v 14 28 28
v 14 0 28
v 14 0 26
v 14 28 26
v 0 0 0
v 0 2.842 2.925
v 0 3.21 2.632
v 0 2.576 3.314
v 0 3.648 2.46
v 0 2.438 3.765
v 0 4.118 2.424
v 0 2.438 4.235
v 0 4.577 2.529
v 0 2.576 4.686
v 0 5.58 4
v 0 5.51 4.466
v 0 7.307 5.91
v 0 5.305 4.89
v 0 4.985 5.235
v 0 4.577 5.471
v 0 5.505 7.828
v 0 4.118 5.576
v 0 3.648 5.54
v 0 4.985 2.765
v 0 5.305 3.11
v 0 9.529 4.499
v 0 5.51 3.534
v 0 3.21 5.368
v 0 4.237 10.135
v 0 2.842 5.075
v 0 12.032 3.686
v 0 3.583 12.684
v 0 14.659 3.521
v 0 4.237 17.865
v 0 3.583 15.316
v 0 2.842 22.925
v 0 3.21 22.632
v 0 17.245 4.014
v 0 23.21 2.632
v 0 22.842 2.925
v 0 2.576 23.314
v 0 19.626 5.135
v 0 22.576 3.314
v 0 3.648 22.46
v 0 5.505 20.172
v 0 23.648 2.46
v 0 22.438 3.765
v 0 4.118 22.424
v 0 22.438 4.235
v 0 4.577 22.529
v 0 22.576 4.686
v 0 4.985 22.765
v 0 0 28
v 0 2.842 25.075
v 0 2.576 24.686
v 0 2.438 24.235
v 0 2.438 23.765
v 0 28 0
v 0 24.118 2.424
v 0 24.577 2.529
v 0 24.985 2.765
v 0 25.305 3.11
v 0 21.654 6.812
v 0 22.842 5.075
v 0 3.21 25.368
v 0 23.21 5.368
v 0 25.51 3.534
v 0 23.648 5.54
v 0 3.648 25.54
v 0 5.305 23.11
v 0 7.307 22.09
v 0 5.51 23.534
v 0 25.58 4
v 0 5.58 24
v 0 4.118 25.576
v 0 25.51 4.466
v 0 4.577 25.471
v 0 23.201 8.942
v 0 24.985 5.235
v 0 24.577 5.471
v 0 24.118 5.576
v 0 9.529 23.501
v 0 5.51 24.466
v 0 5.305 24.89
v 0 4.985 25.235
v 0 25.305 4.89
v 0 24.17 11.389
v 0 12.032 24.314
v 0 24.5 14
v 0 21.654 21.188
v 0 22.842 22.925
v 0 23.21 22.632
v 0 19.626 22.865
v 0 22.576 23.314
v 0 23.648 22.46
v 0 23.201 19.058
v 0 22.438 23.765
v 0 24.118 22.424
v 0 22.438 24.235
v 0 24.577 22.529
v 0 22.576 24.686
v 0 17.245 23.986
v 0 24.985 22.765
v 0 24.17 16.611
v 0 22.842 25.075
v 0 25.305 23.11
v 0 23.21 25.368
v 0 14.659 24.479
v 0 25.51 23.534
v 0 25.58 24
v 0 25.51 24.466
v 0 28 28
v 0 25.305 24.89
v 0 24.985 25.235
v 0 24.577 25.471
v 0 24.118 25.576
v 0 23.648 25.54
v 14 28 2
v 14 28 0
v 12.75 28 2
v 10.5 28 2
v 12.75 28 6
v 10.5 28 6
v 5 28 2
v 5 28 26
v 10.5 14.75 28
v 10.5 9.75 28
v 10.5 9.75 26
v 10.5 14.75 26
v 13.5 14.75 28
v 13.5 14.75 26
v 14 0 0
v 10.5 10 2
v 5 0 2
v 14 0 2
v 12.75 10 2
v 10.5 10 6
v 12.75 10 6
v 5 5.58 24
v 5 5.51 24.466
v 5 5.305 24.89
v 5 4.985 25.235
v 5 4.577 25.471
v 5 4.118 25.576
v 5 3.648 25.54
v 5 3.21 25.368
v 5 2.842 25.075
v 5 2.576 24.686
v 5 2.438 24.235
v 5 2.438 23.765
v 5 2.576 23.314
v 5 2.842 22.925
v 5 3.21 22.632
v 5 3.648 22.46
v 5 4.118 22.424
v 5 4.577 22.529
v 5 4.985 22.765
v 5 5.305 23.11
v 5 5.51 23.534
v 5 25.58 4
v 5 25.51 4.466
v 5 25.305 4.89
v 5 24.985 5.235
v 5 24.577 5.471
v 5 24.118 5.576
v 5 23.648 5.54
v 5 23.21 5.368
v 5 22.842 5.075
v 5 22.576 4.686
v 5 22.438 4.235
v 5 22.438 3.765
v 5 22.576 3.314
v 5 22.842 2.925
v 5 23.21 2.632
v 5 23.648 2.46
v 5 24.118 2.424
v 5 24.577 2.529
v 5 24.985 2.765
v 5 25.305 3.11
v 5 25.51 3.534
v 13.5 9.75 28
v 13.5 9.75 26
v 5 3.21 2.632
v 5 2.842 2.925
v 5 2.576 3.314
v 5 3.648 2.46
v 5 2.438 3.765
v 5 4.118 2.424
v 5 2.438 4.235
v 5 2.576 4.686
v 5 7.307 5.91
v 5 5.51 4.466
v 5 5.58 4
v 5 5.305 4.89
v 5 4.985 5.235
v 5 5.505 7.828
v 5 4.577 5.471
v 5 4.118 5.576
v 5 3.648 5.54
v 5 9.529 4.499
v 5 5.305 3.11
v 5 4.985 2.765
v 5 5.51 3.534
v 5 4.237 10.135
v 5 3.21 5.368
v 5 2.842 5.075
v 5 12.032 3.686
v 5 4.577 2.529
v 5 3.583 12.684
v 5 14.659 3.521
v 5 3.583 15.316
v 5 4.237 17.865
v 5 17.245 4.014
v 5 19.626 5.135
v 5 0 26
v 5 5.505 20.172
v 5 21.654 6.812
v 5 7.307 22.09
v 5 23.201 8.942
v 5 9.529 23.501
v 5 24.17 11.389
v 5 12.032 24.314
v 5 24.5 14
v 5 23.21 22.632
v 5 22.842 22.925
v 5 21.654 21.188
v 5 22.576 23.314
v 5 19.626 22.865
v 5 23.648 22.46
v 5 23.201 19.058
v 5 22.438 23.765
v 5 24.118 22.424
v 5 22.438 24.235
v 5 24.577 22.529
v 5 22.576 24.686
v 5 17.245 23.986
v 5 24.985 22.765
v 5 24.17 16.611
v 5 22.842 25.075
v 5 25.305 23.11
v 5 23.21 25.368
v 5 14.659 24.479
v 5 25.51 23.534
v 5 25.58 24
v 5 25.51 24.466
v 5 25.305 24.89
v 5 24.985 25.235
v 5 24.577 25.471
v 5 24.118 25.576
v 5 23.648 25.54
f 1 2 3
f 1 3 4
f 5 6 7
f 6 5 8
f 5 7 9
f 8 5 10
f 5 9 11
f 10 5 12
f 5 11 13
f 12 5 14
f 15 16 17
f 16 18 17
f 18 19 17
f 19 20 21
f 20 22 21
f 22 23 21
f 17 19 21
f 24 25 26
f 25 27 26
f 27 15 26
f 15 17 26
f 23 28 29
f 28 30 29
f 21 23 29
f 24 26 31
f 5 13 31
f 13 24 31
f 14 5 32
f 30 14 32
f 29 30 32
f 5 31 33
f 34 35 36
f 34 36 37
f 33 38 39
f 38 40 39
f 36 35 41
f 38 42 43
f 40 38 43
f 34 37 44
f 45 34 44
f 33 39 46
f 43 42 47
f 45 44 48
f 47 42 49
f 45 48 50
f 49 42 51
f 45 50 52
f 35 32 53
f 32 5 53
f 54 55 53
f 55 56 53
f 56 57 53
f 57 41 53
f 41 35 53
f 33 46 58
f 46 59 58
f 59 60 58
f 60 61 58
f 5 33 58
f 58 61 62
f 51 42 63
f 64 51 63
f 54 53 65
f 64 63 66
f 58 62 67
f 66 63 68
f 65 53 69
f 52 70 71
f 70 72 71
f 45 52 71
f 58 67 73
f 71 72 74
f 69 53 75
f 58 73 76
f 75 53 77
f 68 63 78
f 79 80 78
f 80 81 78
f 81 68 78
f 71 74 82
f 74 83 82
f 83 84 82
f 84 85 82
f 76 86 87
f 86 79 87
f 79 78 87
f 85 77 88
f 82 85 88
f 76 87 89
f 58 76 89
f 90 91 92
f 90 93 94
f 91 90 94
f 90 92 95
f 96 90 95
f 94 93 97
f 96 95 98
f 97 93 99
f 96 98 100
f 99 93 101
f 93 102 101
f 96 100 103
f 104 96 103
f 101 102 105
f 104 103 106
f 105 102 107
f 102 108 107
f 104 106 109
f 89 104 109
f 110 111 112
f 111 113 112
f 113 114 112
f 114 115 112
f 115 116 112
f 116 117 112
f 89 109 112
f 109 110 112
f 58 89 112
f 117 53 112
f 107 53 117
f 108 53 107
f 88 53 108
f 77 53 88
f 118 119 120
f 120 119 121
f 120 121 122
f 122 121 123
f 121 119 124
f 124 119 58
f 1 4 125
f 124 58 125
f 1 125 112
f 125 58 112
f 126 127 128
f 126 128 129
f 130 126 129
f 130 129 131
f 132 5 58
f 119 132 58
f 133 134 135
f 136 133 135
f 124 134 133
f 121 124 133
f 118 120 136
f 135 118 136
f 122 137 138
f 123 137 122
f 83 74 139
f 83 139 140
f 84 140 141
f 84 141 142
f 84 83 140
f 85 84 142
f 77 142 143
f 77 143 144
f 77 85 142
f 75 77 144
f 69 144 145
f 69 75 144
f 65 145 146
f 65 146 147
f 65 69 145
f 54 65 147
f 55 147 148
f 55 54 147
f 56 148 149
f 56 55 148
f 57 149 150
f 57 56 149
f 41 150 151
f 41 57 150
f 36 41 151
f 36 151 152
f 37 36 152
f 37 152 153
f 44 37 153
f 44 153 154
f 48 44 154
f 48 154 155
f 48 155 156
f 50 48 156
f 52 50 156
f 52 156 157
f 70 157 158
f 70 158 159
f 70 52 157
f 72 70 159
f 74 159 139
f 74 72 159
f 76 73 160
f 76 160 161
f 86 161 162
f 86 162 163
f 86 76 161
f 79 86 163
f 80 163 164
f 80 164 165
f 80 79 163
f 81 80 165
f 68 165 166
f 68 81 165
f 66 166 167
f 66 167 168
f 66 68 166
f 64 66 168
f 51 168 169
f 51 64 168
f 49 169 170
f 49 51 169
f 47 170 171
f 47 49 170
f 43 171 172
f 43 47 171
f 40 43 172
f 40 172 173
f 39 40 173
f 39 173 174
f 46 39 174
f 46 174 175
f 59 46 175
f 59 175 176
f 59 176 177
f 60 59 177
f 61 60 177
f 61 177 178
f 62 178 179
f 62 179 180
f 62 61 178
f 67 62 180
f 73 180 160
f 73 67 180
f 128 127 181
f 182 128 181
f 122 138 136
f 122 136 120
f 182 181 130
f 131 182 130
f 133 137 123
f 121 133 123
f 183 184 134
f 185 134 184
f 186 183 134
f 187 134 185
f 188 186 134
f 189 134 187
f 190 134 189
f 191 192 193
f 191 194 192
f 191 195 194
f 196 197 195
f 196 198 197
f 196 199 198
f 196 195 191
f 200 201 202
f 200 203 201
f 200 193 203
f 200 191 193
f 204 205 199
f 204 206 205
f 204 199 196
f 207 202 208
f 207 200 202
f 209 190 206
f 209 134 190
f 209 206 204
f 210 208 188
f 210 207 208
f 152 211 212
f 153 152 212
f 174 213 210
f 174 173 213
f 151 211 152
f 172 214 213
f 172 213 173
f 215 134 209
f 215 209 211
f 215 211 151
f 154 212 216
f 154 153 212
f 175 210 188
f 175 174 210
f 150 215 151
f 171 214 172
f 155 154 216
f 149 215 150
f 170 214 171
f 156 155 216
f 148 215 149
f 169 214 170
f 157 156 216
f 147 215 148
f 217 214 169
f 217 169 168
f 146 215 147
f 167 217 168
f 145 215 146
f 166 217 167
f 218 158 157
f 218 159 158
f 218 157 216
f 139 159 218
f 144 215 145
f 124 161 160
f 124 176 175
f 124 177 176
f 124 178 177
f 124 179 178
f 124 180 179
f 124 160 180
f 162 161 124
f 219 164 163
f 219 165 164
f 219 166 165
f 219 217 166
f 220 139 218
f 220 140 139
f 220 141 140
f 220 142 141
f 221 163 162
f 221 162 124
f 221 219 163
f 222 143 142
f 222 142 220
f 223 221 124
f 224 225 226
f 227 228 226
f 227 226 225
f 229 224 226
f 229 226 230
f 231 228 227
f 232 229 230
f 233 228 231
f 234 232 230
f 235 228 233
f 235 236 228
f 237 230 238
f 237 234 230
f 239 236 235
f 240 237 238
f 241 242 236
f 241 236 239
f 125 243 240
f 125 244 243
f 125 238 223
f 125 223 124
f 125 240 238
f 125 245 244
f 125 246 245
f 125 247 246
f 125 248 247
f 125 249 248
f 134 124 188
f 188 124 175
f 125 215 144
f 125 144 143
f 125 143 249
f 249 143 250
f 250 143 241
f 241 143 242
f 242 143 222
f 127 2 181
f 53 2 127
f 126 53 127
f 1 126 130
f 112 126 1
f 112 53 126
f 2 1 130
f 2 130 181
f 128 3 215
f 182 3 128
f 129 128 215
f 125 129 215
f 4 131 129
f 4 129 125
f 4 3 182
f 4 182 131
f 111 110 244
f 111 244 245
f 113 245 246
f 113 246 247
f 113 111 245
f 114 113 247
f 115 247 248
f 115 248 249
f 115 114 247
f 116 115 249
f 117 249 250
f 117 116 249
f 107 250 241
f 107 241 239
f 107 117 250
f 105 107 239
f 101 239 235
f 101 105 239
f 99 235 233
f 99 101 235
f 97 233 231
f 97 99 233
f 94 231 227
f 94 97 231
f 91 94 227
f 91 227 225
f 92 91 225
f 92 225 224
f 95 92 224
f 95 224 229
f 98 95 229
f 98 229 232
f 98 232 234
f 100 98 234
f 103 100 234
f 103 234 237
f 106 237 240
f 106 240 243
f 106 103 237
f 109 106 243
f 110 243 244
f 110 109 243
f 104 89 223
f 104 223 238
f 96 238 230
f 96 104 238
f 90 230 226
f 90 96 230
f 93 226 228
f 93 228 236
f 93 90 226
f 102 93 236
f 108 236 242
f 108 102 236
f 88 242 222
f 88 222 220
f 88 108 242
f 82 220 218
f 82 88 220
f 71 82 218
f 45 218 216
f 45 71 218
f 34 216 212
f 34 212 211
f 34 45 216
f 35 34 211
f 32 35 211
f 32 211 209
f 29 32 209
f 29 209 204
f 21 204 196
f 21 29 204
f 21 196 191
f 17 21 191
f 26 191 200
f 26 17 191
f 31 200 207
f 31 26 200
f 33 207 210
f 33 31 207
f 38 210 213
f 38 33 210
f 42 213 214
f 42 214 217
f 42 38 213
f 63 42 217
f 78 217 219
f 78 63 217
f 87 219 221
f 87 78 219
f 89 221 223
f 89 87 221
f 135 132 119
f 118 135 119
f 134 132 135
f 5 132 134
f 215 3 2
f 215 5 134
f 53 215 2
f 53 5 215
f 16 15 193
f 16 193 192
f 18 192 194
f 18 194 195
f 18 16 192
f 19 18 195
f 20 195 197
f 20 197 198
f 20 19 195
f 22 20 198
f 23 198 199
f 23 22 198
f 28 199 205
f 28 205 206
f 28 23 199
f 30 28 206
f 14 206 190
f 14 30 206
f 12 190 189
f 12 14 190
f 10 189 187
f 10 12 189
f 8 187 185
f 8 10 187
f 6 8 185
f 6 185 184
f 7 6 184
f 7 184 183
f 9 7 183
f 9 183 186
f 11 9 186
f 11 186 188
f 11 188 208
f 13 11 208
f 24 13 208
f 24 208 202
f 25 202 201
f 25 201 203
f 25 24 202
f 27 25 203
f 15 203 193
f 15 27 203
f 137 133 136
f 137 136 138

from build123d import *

# Parameters (mm, degrees)
SKETCH_W     = 28
SKETCH_H     = 28
SKETCH_R     = 1.58
SKETCH_R_2   = 10.5
PAD_DEPTH    = 5
SKETCH001_W  = 14
SKETCH001_H  = 28
PAD001_DEPTH = 2
SKETCH002_W  = 28
SKETCH002_H  = 14
PAD002_DEPTH = 2
SKETCH003_W  = 18
SKETCH003_H  = 4
PAD003_DEPTH = 2.25
SKETCH005_W  = 5
SKETCH005_H  = 3
POCKET_DEPTH = 5


with BuildPart() as part:
    # Sketch → Pad (new body)
    with BuildSketch(Plane.YZ):
        with Locations((14, 14)):
            Rectangle(SKETCH_W, SKETCH_H)
        with Locations((4, 24)):
            Circle(SKETCH_R, mode=Mode.SUBTRACT)
        with Locations((24, 24)):
            Circle(SKETCH_R, mode=Mode.SUBTRACT)
        with Locations((24, 4)):
            Circle(SKETCH_R, mode=Mode.SUBTRACT)
        with Locations((4, 4)):
            Circle(SKETCH_R, mode=Mode.SUBTRACT)
        with Locations((14, 14)):
            Circle(SKETCH_R_2, mode=Mode.SUBTRACT)
    extrude(amount=PAD_DEPTH)

    # Sketch001 → Pad001 (join)
    with BuildSketch(Plane.XY):
        with Locations((7, 14)):
            Rectangle(SKETCH001_W, SKETCH001_H)
    extrude(amount=PAD001_DEPTH)

    # Sketch002 (on DatumPlane) → Pad002 (join)
    with BuildSketch(Plane.YX.offset(-28)):
        with Locations((14, 7)):
            Rectangle(SKETCH002_W, SKETCH002_H)
    extrude(amount=PAD002_DEPTH)

    # Sketch003 (on DatumPlane) → Pad003 (join)
    with BuildSketch(Plane(origin=(10.5, -2, 0), x_dir=(0, 1, 0), z_dir=(1, 0, 0))):
        with Locations((21, 4)):
            Rectangle(SKETCH003_W, SKETCH003_H)
    extrude(amount=PAD003_DEPTH)

    # Sketch005 (on DatumPlane) → Pocket (cut)
    with BuildSketch(Plane.YX.offset(-28)):
        with Locations((12.25, 12)):
            Rectangle(SKETCH005_W, SKETCH005_H)
    extrude(amount=POCKET_DEPTH, mode=Mode.SUBTRACT)


solid = part.part
